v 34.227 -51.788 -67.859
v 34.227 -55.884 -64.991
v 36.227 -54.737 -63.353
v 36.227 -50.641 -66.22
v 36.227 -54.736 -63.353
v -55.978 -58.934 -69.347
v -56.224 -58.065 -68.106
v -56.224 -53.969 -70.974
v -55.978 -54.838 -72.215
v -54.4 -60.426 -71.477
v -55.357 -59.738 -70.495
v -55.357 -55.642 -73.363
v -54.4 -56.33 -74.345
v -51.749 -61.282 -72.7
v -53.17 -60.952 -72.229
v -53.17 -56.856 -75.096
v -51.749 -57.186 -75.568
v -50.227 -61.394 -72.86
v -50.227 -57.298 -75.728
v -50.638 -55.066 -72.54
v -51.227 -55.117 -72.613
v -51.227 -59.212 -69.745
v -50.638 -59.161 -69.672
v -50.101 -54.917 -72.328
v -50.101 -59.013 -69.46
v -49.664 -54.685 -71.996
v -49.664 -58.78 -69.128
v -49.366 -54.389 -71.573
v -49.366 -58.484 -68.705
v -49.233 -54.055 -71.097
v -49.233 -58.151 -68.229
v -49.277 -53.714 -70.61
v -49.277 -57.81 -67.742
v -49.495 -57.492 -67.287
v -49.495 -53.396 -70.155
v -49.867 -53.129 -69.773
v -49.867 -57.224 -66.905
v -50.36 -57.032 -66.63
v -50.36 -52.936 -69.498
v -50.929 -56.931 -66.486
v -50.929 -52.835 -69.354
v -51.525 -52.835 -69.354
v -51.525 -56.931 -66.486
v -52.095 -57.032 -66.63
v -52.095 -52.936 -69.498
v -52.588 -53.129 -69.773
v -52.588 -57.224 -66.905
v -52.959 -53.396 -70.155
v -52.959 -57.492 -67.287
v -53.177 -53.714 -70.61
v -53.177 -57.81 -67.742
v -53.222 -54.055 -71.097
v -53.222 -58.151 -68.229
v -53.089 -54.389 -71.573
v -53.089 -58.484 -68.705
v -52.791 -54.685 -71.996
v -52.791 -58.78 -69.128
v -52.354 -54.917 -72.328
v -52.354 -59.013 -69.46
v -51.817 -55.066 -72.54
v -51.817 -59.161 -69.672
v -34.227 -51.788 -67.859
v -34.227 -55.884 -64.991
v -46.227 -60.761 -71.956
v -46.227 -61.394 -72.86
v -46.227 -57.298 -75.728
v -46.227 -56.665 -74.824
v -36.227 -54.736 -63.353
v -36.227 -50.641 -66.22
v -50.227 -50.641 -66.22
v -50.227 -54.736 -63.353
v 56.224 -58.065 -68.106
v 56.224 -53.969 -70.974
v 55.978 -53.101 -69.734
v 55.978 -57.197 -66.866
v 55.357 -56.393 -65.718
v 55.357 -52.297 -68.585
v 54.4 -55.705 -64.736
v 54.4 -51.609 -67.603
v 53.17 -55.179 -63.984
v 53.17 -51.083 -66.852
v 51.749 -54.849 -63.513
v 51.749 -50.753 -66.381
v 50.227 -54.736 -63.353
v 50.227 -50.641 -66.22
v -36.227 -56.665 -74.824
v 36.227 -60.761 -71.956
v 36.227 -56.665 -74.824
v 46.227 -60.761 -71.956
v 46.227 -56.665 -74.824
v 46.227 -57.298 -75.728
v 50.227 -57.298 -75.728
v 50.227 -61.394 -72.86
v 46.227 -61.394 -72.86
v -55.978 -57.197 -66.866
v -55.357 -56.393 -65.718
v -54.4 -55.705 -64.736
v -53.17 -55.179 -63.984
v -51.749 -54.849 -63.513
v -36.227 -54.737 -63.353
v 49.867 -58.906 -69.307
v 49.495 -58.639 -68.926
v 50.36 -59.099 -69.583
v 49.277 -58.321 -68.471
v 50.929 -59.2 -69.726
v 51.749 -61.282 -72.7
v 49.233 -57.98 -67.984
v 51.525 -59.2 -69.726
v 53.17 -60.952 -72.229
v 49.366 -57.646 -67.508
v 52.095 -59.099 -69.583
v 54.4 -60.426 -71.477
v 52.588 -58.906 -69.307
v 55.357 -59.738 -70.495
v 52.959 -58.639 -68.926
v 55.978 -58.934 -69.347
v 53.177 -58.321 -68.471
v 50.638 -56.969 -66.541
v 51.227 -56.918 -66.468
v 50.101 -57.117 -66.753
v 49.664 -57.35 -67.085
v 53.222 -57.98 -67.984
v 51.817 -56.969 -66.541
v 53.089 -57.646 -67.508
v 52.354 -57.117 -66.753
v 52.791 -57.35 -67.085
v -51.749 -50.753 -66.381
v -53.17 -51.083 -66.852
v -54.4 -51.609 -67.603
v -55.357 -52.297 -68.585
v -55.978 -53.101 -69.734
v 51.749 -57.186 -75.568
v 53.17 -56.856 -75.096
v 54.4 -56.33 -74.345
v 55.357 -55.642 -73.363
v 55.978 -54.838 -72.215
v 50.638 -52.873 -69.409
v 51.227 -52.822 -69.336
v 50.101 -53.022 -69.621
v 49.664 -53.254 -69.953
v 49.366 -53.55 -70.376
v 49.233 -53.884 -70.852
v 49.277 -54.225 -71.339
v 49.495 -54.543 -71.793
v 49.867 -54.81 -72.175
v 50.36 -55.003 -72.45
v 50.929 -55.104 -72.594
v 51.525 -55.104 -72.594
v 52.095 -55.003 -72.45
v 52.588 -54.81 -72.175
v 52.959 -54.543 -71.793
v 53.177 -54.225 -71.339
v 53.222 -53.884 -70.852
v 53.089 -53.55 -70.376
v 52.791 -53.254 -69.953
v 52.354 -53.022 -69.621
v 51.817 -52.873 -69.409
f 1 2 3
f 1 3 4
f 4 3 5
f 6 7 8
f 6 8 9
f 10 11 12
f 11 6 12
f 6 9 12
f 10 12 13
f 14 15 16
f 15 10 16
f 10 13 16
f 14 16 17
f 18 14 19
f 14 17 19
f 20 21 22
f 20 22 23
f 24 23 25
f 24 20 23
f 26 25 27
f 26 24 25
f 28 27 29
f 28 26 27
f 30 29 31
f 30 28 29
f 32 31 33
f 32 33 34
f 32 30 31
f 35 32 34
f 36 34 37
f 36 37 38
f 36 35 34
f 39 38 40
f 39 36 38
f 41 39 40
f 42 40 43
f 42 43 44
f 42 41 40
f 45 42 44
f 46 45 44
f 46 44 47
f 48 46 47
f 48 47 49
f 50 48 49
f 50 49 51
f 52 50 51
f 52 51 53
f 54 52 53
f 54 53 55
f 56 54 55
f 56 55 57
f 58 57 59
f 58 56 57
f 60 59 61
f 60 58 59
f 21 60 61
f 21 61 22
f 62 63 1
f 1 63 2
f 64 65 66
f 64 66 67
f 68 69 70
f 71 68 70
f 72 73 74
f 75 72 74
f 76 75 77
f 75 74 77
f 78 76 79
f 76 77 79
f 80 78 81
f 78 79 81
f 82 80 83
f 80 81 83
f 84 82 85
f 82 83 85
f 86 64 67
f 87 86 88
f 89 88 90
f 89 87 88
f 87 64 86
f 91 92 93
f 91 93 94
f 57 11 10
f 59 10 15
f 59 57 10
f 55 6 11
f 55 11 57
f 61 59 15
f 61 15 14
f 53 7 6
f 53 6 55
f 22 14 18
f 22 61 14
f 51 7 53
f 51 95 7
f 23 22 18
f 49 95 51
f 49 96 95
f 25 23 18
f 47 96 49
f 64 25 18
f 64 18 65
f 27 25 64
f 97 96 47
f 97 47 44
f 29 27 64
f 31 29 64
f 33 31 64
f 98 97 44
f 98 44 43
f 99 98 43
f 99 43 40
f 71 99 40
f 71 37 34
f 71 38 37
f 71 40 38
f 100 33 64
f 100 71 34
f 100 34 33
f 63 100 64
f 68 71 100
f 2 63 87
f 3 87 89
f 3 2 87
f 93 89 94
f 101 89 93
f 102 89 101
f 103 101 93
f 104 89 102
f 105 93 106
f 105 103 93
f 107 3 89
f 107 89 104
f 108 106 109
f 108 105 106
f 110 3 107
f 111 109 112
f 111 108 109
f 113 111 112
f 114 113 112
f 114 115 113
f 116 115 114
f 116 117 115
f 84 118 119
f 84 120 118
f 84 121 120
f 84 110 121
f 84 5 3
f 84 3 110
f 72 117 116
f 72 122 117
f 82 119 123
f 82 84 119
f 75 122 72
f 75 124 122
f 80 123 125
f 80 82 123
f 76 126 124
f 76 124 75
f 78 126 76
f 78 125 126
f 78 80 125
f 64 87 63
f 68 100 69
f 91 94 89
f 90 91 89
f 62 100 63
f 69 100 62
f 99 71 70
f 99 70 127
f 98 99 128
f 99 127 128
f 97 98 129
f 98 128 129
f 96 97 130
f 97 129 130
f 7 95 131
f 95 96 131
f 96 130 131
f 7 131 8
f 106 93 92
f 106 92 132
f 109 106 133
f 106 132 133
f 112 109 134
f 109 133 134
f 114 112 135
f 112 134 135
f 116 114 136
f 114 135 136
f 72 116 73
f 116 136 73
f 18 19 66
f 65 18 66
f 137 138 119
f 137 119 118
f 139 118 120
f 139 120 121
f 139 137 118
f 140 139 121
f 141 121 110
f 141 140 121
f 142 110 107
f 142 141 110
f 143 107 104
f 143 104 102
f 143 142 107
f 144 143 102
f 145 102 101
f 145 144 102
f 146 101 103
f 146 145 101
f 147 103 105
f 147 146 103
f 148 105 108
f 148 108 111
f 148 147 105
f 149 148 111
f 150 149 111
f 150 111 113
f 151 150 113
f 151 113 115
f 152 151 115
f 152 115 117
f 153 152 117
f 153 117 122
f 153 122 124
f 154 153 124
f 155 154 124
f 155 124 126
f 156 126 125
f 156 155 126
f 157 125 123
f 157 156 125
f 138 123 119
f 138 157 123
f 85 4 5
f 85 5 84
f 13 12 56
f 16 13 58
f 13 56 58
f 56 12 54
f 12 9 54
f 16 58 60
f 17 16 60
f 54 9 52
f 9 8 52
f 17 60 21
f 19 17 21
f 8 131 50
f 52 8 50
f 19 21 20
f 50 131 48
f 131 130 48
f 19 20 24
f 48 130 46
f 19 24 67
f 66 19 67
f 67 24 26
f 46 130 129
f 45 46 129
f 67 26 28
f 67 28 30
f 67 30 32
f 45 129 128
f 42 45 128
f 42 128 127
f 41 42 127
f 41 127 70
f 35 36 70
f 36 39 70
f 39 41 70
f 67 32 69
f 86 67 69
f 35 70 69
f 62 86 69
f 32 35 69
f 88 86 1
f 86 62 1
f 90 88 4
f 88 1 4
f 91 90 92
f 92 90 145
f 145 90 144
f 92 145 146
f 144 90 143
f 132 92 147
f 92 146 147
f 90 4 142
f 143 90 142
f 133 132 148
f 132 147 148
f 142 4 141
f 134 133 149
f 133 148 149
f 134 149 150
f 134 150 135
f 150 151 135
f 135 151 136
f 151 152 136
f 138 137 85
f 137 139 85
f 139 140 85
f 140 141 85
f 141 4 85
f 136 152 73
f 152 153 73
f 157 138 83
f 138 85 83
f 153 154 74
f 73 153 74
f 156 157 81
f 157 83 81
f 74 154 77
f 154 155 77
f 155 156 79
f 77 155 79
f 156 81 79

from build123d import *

# Parameters (mm, degrees)
SKETCH1_R             = 2
BOSS_EXTRUDE1_DEPTH   = 5
BOSS_EXTRUDE1_2_DEPTH = 5
SKETCH2_W             = 72.454585158
SKETCH2_H             = 8.503113073
BOSS_EXTRUDE2_DEPTH   = 5
CHAMFER1_SIZE         = 2
FILLET1_R             = 6


# Some blends are built 0.0001 mm under size
with BuildPart() as part:
    # Sketch1 → Boss-Extrude1 (new body)
    with BuildSketch(Plane(origin=(0, -2.867032155, 2.007517527), x_dir=(1, 0, 0), z_dir=(0, -0.8191520442889961, 0.5735764363510402))):
        Polygon((-56.227292579, -83.290902945), (-56.227292579, -94.897888962), (-46.227292579, -94.897888962), (-46.227292579, -93.794016018), (-36.227292579, -93.794016018), (-36.227292579, -83.290902945), align=None)
        with Locations(Location((-51.227292579, -89.094395953, 0), (0, 0, 270))):
            Circle(SKETCH1_R, mode=Mode.SUBTRACT)
    extrude(amount=BOSS_EXTRUDE1_DEPTH)



with BuildPart() as body_2:
    # Sketch1 → Boss-Extrude1 2 (new body)
    with BuildSketch(Plane(origin=(0, -2.867032155, 2.007517527), x_dir=(1, 0, 0), z_dir=(0, -0.8191520442889961, 0.5735764363510402))):
        Polygon((36.227292579, -83.290902945), (56.227292579, -83.290902945), (56.227292579, -94.897888962), (46.227292579, -94.897888962), (46.227292579, -93.794016018), (36.227292579, -93.794016018), align=None)
        with Locations(Location((51.227292579, -89.094395953, 0), (0, 0, 90))):
            Circle(SKETCH1_R, mode=Mode.SUBTRACT)
    extrude(amount=BOSS_EXTRUDE1_2_DEPTH)


with BuildPart() as part_1:
    add(part.part)

    add(body_2.part)  # Boss-Extrude2 merges body 2
    # Sketch2 → Boss-Extrude2 (add)
    with BuildSketch(Plane(origin=(0, -6.962792376, 4.875399709), x_dir=(1, 0, 0), z_dir=(0, -0.8191520442889959, 0.5735764363510404))):
        with Locations((0, -89.542459482)):
            Rectangle(SKETCH2_W, SKETCH2_H)
    extrude(amount=-BOSS_EXTRUDE2_DEPTH)

    # Chamfer1
    chamfer1_edges = [part_1.edges().sort_by_distance(p)[0] for p in [
        (36.227292579, -53.83576443, -66.424758888),
        (-36.227292579, -53.83576443, -66.424758888),
    ]]
    chamfer(chamfer1_edges, length=CHAMFER1_SIZE - 0.0001)  # a hair under: the kernel refuses the full size

    # Fillet1
    # the kernel refuses this fillet: 6 mm, written as the material it takes off along each edge
    with BuildSketch(Plane(origin=(56.227292579, -45.010944459, -84.33192876), x_dir=(1.184237892933516e-15, 0.5735764363510399, 0.819152044288996), z_dir=(0, -0.819152044288996, 0.57357643635104)), Plane(origin=(56.227292579, -38.353450782, -74.824042436), x_dir=(-1, 0, 0), z_dir=(0, -0.819152044288996, 0.57357643635104))) as fillet1_piece_1:
        with BuildLine():
            CenterArc((FILLET1_R, FILLET1_R), FILLET1_R, 180, 90)
            Line((0, FILLET1_R), (0, 0))
            Line((0, 0), (FILLET1_R, 0))
        make_face()
    extrude(amount=35, mode=Mode.SUBTRACT)
    with BuildSketch(Plane(origin=(-56.227292579, -38.353450782, -74.824042436), x_dir=(1, 0, 0), z_dir=(0, -0.819152044288996, 0.57357643635104)), Plane(origin=(-56.227292579, -45.010944459, -84.33192876), x_dir=(0, 0.57357643635104, 0.819152044288996), z_dir=(0, -0.819152044288996, 0.57357643635104))) as fillet1_piece_2:
        with BuildLine():
            CenterArc((FILLET1_R, -FILLET1_R), FILLET1_R, 90, 90)
            Line((0, -FILLET1_R), (0, 0))
            Line((0, 0), (FILLET1_R, 0))
        make_face()
    extrude(amount=35, mode=Mode.SUBTRACT)


solid = part_1.part
